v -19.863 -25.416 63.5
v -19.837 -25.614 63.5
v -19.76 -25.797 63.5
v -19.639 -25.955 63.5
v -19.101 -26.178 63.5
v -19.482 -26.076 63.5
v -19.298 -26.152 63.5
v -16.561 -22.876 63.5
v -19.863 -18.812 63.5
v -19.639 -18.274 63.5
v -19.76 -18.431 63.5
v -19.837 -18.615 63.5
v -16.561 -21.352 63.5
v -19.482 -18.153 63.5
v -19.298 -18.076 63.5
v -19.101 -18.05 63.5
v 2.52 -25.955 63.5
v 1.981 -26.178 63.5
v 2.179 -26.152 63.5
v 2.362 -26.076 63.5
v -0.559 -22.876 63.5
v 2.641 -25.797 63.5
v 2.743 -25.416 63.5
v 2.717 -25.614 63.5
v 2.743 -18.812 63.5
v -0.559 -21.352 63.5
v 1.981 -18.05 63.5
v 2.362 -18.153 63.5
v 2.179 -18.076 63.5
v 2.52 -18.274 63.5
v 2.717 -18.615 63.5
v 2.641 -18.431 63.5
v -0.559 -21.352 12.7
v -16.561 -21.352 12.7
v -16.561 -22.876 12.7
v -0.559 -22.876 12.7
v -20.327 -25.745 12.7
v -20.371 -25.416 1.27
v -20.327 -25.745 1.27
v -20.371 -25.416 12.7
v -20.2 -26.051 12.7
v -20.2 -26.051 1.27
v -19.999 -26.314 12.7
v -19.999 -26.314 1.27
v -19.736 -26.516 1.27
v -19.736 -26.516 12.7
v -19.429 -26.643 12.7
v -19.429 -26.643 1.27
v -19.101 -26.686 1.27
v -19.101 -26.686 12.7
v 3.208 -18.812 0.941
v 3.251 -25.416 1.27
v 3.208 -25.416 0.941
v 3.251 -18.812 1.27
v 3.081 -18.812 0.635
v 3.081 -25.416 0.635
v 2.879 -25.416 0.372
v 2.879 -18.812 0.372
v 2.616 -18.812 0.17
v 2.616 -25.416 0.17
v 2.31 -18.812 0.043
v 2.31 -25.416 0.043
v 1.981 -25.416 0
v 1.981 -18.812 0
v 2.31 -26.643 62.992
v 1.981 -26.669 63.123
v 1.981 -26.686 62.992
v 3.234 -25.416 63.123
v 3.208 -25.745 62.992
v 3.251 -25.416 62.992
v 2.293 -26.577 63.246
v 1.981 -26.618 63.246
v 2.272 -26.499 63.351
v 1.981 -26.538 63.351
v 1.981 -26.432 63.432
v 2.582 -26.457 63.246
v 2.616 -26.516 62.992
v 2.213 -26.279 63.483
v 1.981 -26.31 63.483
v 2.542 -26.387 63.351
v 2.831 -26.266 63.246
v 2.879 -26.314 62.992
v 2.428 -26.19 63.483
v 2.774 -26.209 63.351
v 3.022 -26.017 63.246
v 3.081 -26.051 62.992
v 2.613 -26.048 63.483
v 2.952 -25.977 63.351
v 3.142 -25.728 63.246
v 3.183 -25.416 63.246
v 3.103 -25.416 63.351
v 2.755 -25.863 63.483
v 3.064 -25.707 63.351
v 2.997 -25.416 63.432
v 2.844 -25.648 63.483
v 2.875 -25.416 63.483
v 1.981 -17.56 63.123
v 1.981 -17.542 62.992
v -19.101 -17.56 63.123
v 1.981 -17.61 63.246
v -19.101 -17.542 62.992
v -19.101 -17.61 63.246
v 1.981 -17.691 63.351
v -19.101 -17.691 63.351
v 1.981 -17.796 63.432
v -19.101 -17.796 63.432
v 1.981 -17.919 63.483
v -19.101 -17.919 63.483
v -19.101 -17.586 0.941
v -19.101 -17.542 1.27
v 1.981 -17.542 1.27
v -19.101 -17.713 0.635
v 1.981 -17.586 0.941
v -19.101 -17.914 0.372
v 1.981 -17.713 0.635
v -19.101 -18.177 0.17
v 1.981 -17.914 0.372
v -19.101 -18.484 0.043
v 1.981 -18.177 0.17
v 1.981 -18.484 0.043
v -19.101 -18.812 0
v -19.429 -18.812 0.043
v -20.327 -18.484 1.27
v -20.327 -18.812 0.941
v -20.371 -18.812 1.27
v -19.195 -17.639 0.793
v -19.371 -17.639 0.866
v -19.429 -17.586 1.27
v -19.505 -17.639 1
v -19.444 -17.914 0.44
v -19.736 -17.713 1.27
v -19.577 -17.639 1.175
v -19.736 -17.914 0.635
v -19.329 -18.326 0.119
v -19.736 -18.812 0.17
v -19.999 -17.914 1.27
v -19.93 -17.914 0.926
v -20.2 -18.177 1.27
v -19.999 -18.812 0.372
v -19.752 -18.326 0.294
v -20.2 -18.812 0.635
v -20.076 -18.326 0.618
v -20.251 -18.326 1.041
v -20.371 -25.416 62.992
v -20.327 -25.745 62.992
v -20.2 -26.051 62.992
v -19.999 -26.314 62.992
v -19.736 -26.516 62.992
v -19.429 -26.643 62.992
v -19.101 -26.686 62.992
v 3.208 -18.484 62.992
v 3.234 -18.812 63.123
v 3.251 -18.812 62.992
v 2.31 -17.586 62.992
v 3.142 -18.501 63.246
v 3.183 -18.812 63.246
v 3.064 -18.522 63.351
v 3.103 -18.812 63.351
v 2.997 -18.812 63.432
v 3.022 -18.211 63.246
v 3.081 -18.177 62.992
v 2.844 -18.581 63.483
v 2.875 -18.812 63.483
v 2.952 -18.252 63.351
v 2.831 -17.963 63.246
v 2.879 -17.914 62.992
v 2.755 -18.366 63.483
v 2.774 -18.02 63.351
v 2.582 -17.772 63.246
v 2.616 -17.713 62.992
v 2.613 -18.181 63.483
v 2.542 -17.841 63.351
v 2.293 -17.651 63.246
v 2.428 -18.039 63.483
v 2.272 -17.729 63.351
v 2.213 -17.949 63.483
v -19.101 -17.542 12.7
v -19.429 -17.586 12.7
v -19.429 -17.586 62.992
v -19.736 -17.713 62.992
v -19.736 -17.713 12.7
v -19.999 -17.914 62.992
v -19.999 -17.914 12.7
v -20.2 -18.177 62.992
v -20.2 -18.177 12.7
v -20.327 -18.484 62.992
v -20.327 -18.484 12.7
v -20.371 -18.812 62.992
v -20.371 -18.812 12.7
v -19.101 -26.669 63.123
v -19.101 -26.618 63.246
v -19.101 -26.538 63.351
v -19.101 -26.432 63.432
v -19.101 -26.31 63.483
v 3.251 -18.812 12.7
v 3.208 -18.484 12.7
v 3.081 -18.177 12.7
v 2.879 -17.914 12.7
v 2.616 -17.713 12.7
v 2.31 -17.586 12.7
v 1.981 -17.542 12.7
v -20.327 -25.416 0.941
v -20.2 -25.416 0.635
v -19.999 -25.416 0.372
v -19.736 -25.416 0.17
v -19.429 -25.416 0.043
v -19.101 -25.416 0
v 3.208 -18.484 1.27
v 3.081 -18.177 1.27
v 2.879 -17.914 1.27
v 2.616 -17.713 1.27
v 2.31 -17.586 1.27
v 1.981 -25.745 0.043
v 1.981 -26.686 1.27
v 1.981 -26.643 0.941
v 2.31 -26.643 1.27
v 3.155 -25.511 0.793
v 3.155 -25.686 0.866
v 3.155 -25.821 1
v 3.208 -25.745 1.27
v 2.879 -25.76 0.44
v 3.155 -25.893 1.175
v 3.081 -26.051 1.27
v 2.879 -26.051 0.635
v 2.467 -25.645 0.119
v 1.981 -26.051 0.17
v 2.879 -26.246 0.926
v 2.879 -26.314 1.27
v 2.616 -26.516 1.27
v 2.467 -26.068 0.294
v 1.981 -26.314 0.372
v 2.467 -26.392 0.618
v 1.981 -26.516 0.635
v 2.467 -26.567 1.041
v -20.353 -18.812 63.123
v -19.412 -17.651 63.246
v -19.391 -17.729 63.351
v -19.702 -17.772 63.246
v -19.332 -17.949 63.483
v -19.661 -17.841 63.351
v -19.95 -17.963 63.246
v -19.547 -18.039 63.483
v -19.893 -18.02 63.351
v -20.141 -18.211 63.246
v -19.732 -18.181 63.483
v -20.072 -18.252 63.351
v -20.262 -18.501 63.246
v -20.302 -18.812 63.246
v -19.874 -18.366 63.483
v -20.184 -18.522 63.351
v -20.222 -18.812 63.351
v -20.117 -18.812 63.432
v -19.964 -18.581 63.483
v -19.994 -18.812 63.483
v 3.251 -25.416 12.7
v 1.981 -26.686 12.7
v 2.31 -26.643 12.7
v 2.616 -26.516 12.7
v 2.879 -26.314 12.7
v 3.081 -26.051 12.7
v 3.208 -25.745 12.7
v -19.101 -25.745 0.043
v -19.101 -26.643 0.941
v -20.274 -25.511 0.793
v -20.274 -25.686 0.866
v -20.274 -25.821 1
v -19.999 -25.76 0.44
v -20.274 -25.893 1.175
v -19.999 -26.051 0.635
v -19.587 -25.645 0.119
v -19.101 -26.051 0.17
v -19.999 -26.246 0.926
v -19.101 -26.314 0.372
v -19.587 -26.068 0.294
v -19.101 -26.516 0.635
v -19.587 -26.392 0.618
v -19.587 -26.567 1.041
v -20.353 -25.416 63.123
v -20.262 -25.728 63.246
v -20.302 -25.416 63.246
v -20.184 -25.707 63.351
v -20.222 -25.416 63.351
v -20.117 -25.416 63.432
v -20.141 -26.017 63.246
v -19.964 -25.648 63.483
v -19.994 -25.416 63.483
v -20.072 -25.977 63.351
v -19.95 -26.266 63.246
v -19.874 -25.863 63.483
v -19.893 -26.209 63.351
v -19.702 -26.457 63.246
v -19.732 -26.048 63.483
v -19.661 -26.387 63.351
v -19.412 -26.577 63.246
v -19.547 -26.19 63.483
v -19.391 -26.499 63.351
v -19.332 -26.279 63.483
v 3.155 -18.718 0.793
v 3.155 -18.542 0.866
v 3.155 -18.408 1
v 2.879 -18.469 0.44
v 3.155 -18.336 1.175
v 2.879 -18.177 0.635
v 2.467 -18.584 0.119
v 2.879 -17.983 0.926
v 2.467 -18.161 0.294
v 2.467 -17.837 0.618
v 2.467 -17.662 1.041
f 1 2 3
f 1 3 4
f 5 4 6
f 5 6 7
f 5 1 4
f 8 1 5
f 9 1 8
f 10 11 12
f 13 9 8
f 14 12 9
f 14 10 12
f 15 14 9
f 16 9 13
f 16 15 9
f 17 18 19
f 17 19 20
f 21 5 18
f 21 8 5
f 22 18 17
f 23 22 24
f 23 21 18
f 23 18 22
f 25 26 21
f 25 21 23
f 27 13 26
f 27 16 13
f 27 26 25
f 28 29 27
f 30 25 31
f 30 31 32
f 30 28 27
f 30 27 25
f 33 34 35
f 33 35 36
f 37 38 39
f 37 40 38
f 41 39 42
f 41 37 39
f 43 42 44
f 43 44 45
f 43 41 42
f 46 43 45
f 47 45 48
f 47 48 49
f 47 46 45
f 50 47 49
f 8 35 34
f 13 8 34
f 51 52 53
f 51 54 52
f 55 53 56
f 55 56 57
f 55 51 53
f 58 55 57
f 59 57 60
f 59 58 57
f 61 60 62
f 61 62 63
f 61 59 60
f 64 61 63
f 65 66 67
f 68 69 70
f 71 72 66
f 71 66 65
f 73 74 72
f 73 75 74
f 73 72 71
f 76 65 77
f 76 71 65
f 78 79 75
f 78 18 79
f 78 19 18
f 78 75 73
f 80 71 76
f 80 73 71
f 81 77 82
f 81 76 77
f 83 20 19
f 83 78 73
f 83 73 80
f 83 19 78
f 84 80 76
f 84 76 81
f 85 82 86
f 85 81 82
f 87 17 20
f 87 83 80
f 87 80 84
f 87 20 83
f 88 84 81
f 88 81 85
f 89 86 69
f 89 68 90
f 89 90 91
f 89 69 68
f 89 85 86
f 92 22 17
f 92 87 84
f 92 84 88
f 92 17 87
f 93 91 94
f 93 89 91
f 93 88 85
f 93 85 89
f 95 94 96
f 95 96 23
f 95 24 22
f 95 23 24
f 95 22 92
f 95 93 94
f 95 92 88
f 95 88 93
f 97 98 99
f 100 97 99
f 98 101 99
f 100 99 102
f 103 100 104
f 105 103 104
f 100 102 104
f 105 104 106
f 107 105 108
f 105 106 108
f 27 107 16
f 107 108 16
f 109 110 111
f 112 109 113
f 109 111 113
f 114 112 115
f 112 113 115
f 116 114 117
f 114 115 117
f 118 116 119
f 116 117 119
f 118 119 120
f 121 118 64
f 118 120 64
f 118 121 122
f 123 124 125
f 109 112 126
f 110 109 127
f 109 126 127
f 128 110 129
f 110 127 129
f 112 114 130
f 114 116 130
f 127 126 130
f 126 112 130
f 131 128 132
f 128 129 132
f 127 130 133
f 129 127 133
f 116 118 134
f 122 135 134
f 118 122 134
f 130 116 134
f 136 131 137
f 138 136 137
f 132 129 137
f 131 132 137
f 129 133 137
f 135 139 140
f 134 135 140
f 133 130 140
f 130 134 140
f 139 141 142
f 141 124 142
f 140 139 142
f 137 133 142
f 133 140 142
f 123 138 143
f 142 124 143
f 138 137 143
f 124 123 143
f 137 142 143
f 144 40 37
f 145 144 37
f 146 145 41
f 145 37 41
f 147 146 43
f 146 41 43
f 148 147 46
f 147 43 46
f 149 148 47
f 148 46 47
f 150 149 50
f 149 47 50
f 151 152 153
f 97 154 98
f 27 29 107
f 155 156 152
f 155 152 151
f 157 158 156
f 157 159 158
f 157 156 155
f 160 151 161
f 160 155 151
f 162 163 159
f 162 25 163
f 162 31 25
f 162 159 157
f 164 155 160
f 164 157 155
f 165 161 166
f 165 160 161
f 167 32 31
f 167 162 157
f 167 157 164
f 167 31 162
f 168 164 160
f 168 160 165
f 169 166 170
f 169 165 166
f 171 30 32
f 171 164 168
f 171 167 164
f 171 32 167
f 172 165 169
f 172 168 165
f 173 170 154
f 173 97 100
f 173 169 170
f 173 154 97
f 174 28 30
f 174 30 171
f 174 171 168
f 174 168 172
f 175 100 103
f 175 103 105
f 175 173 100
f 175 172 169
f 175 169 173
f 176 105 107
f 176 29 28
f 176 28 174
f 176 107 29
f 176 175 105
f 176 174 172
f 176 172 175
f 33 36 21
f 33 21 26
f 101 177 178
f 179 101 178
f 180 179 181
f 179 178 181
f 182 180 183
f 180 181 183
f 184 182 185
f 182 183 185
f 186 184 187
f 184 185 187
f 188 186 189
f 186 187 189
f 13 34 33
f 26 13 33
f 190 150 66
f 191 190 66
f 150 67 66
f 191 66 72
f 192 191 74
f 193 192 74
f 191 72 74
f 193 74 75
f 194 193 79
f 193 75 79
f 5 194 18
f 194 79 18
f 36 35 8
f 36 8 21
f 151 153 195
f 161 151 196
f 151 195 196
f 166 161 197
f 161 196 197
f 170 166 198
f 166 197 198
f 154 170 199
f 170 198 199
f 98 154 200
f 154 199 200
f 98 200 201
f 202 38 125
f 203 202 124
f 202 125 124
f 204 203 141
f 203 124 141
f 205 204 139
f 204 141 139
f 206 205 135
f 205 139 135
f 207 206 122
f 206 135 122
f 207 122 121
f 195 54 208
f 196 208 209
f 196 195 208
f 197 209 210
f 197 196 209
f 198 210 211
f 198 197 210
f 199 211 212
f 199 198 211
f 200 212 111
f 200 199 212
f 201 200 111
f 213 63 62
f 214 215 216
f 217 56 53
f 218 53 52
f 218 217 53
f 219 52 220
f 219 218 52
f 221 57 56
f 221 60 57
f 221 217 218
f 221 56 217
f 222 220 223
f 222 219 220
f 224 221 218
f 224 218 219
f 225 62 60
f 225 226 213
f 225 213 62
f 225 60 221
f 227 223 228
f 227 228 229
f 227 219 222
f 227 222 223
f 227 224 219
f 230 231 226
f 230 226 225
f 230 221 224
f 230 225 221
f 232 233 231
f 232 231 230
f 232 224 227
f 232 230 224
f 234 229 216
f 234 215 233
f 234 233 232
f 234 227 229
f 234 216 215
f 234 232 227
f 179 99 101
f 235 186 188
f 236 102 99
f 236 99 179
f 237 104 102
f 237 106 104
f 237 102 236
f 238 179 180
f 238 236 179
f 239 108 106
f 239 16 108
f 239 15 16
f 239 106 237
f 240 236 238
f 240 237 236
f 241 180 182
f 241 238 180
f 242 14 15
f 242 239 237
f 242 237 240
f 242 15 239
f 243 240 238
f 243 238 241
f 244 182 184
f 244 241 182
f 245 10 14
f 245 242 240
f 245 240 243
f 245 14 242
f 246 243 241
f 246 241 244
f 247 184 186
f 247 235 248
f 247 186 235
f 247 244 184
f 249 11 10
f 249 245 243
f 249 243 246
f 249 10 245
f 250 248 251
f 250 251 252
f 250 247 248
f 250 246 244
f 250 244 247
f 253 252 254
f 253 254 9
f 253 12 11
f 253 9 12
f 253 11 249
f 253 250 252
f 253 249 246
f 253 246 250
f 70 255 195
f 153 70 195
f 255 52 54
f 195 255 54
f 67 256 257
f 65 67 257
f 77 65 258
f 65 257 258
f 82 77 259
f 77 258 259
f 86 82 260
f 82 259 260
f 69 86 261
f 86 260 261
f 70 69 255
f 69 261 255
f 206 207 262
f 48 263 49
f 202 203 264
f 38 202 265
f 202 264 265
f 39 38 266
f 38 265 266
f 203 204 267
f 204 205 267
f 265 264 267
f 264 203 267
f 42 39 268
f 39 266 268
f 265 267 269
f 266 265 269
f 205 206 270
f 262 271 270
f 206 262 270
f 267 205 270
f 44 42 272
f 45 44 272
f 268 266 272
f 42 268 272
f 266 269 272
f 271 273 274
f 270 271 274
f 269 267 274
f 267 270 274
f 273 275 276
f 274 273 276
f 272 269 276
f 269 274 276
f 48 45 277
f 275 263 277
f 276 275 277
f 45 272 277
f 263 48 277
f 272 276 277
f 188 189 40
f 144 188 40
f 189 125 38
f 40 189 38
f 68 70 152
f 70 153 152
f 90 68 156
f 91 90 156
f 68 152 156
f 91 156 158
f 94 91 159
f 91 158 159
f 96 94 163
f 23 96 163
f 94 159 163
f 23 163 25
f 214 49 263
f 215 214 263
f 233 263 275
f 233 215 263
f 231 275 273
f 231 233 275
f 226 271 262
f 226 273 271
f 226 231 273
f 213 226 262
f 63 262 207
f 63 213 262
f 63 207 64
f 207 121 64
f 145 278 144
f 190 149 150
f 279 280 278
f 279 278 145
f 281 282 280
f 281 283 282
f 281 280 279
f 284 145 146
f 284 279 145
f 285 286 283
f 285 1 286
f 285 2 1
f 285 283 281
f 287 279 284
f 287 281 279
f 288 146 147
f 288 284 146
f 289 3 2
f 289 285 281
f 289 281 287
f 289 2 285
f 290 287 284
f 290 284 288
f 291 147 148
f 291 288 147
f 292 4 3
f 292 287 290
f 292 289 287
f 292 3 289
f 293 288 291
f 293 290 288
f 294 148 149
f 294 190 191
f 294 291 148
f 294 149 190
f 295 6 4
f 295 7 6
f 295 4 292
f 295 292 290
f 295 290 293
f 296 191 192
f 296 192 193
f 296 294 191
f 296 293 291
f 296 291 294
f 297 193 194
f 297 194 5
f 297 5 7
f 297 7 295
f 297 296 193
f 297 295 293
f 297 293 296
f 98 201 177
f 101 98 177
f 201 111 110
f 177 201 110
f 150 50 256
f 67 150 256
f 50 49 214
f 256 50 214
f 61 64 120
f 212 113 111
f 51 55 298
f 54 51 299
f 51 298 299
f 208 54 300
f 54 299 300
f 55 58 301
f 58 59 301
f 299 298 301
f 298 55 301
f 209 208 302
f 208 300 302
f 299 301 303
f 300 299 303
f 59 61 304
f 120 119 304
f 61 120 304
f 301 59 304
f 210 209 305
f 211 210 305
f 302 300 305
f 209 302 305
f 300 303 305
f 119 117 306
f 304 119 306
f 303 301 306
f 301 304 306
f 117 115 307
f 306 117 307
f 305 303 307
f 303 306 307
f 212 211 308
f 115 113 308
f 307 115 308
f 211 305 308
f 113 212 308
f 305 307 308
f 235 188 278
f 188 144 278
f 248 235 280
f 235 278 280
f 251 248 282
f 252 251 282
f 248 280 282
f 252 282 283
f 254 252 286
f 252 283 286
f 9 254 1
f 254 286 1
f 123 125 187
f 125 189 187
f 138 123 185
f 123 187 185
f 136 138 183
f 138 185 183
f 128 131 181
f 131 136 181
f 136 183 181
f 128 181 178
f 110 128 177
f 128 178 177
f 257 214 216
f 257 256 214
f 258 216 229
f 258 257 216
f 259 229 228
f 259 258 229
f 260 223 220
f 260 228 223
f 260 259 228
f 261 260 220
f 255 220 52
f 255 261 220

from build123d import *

# Parameters (mm, degrees)
F0_W     = 23.622
F0_H     = 9.144
F1_DEPTH = 12.7
F2_R     = 1.27
F3_W     = 16.002
F3_H     = 1.524
F4_DEPTH = 50.8
F5_R     = 0.508


with BuildPart() as f1:
    # F0 (on Top) → F1 (new body)
    with BuildSketch(Plane.XY):
        with Locations((-8.5595357362, -22.114415653)):
            Rectangle(F0_W, F0_H)
    extrude(amount=F1_DEPTH)

    # F2
    f2_edges = [f1.edges().sort_by_distance(p)[0] for p in [
        (-8.559536, -26.686416, 0),
        (-20.370536, -22.114416, 0),
        (-8.559536, -17.542416, 0),
        (3.251464, -22.114416, 0),
        (3.251464, -17.542416, 6.35),
        (-20.370536, -17.542416, 6.35),
        (-20.370536, -26.686416, 6.35),
        (3.251464, -26.686416, 6.35),
    ]]
    fillet(f2_edges, radius=F2_R)

    # F3 (on face) → F4 (join)
    with BuildSketch(Plane.XY.offset(12.7)):
        with BuildLine():
            ThreePointArc((3.2514642638, -18.812415653), (2.8794898759, -17.9143900409), (1.9814642638, -17.542415653))
            Line((1.9814642638, -17.542415653), (-19.1005357362, -17.542415653))
            ThreePointArc((-19.1005357362, -17.542415653), (-19.9985613483, -17.9143900409), (-20.3705357362, -18.812415653))
            Line((-20.3705357362, -18.812415653), (-20.3705357362, -25.416415653))
            ThreePointArc((-20.3705357362, -25.416415653), (-19.9985613483, -26.3144412652), (-19.1005357362, -26.686415653))
            Line((-19.1005357362, -26.686415653), (1.9814642638, -26.686415653))
            ThreePointArc((1.9814642638, -26.686415653), (2.8794898759, -26.3144412652), (3.2514642638, -25.416415653))
            Line((3.2514642638, -25.416415653), (3.2514642638, -18.812415653))
        make_face()
        with Locations((-8.5595357362, -22.114415653)):
            Rectangle(F3_W, F3_H, mode=Mode.SUBTRACT)
    extrude(amount=F4_DEPTH)

    # F5
    f5_edges = [f1.edges().sort_by_distance(p)[0] for p in [
        (-8.559536, -17.542416, 63.5),
        (3.251464, -22.114416, 63.5),
        (-8.559536, -26.686416, 63.5),
        (-20.370536, -22.114416, 63.5),
        (2.87949, -26.314441, 63.5),
        (-19.998561, -26.314441, 63.5),
        (-19.998561, -17.91439, 63.5),
        (2.87949, -17.91439, 63.5),
    ]]
    fillet(f5_edges, radius=F5_R)


solid = f1.part
